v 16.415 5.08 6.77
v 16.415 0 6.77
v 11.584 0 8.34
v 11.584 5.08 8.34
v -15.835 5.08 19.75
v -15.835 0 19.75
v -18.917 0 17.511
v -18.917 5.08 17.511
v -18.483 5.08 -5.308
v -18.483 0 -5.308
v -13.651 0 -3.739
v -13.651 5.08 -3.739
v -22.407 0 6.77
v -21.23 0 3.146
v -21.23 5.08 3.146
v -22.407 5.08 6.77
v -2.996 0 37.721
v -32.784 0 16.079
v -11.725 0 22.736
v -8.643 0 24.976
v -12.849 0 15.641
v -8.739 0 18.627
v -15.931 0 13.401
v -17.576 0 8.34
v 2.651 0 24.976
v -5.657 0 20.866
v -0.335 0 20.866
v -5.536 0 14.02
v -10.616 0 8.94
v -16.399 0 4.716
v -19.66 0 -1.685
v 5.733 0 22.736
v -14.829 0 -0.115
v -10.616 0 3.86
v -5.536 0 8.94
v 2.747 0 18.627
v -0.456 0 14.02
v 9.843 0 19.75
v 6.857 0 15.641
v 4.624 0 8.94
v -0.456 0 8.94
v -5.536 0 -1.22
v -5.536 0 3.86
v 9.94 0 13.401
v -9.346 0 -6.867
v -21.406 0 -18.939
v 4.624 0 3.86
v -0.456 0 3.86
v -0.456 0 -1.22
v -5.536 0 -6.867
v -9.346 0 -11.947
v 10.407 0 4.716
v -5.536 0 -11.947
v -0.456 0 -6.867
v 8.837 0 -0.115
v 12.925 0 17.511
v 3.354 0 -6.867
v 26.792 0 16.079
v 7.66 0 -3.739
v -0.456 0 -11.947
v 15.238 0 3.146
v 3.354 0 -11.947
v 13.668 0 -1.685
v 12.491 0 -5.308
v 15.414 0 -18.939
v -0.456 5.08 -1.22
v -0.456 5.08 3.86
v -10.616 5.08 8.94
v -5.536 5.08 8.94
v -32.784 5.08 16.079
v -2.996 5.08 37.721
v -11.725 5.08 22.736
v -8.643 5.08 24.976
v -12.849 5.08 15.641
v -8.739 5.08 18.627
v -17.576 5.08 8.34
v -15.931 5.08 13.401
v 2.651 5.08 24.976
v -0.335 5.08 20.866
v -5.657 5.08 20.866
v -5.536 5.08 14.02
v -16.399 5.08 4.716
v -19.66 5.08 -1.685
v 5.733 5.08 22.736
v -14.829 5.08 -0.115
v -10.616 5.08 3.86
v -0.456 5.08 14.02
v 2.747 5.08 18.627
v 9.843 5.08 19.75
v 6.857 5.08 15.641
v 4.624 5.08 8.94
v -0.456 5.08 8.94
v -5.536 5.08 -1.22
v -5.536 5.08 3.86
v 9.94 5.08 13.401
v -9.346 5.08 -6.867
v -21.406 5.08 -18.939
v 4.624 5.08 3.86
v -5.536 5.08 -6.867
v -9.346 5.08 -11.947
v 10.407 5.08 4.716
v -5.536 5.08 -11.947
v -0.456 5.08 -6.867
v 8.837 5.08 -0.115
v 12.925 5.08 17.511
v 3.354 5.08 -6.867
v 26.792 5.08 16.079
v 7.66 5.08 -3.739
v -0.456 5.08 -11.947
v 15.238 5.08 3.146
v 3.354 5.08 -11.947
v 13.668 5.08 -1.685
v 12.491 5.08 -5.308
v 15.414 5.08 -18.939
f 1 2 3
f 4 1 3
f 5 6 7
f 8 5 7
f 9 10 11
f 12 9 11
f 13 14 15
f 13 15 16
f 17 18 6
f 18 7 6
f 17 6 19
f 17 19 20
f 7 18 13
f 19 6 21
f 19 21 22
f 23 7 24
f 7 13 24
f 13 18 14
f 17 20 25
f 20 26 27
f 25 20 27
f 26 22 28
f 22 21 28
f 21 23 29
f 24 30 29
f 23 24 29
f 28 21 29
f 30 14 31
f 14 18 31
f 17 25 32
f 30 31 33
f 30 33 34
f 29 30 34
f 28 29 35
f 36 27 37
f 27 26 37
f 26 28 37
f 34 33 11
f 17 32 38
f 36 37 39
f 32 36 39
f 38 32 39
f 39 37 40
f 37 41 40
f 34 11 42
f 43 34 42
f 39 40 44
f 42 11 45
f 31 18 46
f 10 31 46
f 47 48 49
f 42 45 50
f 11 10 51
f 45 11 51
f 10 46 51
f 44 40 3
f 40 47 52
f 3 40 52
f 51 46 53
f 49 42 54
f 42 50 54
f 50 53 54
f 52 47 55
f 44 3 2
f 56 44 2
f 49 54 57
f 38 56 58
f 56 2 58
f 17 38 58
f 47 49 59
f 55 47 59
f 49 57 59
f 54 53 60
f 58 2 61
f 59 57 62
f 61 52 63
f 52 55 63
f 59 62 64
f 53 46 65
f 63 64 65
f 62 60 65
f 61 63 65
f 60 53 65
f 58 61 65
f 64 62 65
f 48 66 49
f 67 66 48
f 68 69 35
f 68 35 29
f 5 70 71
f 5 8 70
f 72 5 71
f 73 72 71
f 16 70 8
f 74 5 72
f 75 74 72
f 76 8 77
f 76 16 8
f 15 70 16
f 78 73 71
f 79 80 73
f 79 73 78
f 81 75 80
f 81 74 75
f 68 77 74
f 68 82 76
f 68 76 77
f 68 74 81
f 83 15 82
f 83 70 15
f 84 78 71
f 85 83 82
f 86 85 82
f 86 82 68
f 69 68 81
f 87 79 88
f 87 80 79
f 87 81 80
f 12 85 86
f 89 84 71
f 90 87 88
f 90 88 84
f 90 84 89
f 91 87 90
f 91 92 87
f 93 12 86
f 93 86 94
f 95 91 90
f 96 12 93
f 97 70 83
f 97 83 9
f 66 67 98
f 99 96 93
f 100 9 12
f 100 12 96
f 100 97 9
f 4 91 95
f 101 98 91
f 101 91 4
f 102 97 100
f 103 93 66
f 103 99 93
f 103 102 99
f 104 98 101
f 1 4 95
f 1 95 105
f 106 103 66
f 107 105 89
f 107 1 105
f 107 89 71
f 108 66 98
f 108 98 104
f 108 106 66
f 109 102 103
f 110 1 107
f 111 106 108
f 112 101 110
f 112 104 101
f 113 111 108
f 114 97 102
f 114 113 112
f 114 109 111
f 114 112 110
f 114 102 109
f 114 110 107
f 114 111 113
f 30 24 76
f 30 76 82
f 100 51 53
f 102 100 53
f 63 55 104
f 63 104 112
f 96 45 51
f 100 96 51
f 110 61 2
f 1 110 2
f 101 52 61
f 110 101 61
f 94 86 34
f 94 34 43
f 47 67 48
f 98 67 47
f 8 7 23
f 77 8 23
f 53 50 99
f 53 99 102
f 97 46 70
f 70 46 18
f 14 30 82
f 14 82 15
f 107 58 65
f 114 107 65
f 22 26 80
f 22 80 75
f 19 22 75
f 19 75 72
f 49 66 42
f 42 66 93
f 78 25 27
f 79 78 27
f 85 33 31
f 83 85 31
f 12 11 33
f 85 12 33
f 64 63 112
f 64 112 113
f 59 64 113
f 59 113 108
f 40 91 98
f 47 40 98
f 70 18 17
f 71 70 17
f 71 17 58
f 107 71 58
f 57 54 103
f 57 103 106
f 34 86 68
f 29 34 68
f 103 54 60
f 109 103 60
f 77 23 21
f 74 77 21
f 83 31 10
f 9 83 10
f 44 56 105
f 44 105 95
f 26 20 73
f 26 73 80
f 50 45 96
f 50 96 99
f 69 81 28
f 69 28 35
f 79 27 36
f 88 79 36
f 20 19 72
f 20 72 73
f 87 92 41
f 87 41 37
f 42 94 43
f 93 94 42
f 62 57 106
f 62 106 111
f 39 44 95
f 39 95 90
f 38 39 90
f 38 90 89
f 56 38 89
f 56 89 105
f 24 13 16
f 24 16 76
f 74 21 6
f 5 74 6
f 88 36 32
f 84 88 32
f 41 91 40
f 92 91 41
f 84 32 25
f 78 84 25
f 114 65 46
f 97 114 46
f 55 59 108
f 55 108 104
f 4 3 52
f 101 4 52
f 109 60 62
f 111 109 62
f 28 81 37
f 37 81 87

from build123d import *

# Parameters (mm, degrees)
SKETCH1_W           = 3.81
SKETCH1_H           = 5.08
BOSS_EXTRUDE1_DEPTH = 5.08
CUT_EXTRUDE1_DEPTH  = 5.08


with BuildPart() as part:
    # Sketch1 → Boss-Extrude1 (new body)
    with BuildSketch(Plane(origin=(0, 0, 0), x_dir=(1, 0, 0), z_dir=(0, 1, 0))):
        Polygon((-2.995905159, -37.721169498), (26.791971131, -16.079010555), (15.414014841, 18.938738206), (-21.405825159, 18.938738206), (-32.783781449, -16.079010555), align=None)
        Polygon((15.238089821, -3.146472779), (16.415444569, -6.769998106), (11.584077466, -8.339804437), (10.406722718, -4.71627911), align=None, mode=Mode.SUBTRACT)
        with Locations((1.449094841, 9.40671805)):
            Rectangle(SKETCH1_W, SKETCH1_H, mode=Mode.SUBTRACT)
        with Locations((-7.440905159, 9.40671805)):
            Rectangle(SKETCH1_W, SKETCH1_H, mode=Mode.SUBTRACT)
        Polygon((13.668283489, 1.684894324), (12.490928741, 5.308419651), (7.659561638, 3.73861332), (8.836916386, 0.115087993), align=None, mode=Mode.SUBTRACT)
        Polygon((5.733323489, -22.736401436), (2.650968741, -24.975863247), (-0.334980341, -20.866056916), (2.747374408, -18.626595105), align=None, mode=Mode.SUBTRACT)
        Polygon((9.843129821, -19.750452355), (12.925484569, -17.510990543), (9.939535488, -13.401184212), (6.857180739, -15.640646023), align=None, mode=Mode.SUBTRACT)
        Polygon((-15.834940138, -19.750452355), (-18.917294887, -17.510990543), (-15.931345805, -13.401184212), (-12.848991056, -15.640646023), align=None, mode=Mode.SUBTRACT)
        Polygon((-11.725133807, -22.736401436), (-8.642779058, -24.975863247), (-5.656829976, -20.866056916), (-8.739184725, -18.626595105), align=None, mode=Mode.SUBTRACT)
        Polygon((-19.660093807, 1.684894324), (-18.482739058, 5.308419651), (-13.651371955, 3.73861332), (-14.828726704, 0.115087993), align=None, mode=Mode.SUBTRACT)
        Polygon((-21.229900138, -3.146472779), (-22.407254887, -6.769998106), (-17.575887784, -8.339804437), (-16.398533035, -4.71627911), align=None, mode=Mode.SUBTRACT)
    extrude(amount=BOSS_EXTRUDE1_DEPTH)

    # Sketch2 → Cut-Extrude1 (cut)
    with BuildSketch(Plane(origin=(0, 5.08, 0), x_dir=(1, 0, 0), z_dir=(0, 1, 0))):
        Polygon((-2.995905159, 1.219657161), (-0.455905159, 1.219657161), (-0.455905159, -3.860342839), (4.624094841, -3.860342839), (4.624094841, -6.400342839), (4.624094841, -8.940342839), (-0.455905159, -8.940342839), (-0.455905159, -14.020342839), (-2.995905159, -14.020342839), (-5.535905159, -14.020342839), (-5.535905159, -8.940342839), (-10.615905159, -8.940342839), (-10.615905159, -6.400342839), (-10.615905159, -3.860342839), (-5.535905159, -3.860342839), (-5.535905159, 1.219657161), align=None)
    extrude(amount=-CUT_EXTRUDE1_DEPTH, mode=Mode.SUBTRACT)


solid = part.part
